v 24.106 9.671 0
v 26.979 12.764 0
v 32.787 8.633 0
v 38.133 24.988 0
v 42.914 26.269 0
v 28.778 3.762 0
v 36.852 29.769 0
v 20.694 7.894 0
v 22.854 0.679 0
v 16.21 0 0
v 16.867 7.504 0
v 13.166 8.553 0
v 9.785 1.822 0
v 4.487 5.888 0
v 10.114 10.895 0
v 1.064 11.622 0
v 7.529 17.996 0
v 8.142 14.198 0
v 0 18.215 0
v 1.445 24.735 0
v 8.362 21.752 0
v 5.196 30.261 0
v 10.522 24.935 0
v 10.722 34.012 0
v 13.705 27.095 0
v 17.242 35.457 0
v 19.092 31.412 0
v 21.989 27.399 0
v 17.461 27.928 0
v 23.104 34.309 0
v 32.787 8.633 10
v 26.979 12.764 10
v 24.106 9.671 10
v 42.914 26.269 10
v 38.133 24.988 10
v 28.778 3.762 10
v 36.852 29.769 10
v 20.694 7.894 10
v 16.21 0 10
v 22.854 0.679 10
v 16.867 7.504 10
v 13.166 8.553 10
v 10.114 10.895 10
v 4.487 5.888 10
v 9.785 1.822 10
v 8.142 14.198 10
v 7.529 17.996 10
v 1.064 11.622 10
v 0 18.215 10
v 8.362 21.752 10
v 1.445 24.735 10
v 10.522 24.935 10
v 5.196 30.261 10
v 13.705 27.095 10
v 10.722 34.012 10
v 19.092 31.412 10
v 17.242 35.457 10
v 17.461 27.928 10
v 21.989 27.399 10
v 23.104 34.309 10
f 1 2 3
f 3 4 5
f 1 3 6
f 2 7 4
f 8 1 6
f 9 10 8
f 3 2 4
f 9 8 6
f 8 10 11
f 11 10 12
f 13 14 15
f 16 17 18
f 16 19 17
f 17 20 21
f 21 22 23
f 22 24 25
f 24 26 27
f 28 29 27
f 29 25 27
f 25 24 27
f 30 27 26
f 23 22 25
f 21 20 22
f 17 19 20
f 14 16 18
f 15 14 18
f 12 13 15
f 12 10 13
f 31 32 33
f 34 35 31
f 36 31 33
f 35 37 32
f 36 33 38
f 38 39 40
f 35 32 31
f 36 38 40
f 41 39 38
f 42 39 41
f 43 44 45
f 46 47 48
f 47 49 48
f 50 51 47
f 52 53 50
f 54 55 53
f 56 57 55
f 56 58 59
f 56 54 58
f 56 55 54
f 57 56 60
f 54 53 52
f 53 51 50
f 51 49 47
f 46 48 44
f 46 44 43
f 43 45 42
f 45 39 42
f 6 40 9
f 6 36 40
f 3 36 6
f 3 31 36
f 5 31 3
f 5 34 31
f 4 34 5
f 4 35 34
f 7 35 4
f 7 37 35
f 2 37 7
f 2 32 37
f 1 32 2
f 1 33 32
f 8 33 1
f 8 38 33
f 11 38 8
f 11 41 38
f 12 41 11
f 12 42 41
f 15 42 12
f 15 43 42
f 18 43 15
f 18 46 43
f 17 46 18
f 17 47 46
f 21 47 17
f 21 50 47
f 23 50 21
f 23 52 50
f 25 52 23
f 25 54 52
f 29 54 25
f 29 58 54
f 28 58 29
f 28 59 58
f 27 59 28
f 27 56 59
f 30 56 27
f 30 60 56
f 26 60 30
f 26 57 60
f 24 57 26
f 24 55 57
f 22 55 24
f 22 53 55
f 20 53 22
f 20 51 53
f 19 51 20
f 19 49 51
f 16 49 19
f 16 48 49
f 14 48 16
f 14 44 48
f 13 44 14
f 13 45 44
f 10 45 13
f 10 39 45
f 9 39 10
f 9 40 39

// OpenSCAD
$fn = 32;

// ----------------------------------------------------------------------
// Eye lug: ring_tail, 10 mm thick
// ----------------------------------------------------------------------

// --- parameters (mm) ---
profile_height = 10;      // extrusion height
profile_points = 30;      // points of the closed outline

profile = [[19.092, 31.412], [23.104, 34.309], [17.242, 35.457], [10.722, 34.012], [5.196, 30.261], [1.445, 24.735], [0, 18.215], [1.064, 11.622], [4.487, 5.888], [9.785, 1.822], [16.21, 0], [22.854, 0.679], [28.778, 3.762], [32.787, 8.633], [42.914, 26.269], [38.133, 24.988], [36.852, 29.769], [26.979, 12.764], [24.106, 9.671], [20.694, 7.894], [16.867, 7.504], [13.166, 8.553], [10.114, 10.895], [8.142, 14.198], [7.529, 17.996], [8.362, 21.752], [10.522, 24.935], [13.705, 27.095], [17.461, 27.928], [21.989, 27.399]];  // single closed polygon, 30 points, counter clockwise

// --- the one profile operation ---
linear_extrude(height = profile_height) polygon(points = profile);
